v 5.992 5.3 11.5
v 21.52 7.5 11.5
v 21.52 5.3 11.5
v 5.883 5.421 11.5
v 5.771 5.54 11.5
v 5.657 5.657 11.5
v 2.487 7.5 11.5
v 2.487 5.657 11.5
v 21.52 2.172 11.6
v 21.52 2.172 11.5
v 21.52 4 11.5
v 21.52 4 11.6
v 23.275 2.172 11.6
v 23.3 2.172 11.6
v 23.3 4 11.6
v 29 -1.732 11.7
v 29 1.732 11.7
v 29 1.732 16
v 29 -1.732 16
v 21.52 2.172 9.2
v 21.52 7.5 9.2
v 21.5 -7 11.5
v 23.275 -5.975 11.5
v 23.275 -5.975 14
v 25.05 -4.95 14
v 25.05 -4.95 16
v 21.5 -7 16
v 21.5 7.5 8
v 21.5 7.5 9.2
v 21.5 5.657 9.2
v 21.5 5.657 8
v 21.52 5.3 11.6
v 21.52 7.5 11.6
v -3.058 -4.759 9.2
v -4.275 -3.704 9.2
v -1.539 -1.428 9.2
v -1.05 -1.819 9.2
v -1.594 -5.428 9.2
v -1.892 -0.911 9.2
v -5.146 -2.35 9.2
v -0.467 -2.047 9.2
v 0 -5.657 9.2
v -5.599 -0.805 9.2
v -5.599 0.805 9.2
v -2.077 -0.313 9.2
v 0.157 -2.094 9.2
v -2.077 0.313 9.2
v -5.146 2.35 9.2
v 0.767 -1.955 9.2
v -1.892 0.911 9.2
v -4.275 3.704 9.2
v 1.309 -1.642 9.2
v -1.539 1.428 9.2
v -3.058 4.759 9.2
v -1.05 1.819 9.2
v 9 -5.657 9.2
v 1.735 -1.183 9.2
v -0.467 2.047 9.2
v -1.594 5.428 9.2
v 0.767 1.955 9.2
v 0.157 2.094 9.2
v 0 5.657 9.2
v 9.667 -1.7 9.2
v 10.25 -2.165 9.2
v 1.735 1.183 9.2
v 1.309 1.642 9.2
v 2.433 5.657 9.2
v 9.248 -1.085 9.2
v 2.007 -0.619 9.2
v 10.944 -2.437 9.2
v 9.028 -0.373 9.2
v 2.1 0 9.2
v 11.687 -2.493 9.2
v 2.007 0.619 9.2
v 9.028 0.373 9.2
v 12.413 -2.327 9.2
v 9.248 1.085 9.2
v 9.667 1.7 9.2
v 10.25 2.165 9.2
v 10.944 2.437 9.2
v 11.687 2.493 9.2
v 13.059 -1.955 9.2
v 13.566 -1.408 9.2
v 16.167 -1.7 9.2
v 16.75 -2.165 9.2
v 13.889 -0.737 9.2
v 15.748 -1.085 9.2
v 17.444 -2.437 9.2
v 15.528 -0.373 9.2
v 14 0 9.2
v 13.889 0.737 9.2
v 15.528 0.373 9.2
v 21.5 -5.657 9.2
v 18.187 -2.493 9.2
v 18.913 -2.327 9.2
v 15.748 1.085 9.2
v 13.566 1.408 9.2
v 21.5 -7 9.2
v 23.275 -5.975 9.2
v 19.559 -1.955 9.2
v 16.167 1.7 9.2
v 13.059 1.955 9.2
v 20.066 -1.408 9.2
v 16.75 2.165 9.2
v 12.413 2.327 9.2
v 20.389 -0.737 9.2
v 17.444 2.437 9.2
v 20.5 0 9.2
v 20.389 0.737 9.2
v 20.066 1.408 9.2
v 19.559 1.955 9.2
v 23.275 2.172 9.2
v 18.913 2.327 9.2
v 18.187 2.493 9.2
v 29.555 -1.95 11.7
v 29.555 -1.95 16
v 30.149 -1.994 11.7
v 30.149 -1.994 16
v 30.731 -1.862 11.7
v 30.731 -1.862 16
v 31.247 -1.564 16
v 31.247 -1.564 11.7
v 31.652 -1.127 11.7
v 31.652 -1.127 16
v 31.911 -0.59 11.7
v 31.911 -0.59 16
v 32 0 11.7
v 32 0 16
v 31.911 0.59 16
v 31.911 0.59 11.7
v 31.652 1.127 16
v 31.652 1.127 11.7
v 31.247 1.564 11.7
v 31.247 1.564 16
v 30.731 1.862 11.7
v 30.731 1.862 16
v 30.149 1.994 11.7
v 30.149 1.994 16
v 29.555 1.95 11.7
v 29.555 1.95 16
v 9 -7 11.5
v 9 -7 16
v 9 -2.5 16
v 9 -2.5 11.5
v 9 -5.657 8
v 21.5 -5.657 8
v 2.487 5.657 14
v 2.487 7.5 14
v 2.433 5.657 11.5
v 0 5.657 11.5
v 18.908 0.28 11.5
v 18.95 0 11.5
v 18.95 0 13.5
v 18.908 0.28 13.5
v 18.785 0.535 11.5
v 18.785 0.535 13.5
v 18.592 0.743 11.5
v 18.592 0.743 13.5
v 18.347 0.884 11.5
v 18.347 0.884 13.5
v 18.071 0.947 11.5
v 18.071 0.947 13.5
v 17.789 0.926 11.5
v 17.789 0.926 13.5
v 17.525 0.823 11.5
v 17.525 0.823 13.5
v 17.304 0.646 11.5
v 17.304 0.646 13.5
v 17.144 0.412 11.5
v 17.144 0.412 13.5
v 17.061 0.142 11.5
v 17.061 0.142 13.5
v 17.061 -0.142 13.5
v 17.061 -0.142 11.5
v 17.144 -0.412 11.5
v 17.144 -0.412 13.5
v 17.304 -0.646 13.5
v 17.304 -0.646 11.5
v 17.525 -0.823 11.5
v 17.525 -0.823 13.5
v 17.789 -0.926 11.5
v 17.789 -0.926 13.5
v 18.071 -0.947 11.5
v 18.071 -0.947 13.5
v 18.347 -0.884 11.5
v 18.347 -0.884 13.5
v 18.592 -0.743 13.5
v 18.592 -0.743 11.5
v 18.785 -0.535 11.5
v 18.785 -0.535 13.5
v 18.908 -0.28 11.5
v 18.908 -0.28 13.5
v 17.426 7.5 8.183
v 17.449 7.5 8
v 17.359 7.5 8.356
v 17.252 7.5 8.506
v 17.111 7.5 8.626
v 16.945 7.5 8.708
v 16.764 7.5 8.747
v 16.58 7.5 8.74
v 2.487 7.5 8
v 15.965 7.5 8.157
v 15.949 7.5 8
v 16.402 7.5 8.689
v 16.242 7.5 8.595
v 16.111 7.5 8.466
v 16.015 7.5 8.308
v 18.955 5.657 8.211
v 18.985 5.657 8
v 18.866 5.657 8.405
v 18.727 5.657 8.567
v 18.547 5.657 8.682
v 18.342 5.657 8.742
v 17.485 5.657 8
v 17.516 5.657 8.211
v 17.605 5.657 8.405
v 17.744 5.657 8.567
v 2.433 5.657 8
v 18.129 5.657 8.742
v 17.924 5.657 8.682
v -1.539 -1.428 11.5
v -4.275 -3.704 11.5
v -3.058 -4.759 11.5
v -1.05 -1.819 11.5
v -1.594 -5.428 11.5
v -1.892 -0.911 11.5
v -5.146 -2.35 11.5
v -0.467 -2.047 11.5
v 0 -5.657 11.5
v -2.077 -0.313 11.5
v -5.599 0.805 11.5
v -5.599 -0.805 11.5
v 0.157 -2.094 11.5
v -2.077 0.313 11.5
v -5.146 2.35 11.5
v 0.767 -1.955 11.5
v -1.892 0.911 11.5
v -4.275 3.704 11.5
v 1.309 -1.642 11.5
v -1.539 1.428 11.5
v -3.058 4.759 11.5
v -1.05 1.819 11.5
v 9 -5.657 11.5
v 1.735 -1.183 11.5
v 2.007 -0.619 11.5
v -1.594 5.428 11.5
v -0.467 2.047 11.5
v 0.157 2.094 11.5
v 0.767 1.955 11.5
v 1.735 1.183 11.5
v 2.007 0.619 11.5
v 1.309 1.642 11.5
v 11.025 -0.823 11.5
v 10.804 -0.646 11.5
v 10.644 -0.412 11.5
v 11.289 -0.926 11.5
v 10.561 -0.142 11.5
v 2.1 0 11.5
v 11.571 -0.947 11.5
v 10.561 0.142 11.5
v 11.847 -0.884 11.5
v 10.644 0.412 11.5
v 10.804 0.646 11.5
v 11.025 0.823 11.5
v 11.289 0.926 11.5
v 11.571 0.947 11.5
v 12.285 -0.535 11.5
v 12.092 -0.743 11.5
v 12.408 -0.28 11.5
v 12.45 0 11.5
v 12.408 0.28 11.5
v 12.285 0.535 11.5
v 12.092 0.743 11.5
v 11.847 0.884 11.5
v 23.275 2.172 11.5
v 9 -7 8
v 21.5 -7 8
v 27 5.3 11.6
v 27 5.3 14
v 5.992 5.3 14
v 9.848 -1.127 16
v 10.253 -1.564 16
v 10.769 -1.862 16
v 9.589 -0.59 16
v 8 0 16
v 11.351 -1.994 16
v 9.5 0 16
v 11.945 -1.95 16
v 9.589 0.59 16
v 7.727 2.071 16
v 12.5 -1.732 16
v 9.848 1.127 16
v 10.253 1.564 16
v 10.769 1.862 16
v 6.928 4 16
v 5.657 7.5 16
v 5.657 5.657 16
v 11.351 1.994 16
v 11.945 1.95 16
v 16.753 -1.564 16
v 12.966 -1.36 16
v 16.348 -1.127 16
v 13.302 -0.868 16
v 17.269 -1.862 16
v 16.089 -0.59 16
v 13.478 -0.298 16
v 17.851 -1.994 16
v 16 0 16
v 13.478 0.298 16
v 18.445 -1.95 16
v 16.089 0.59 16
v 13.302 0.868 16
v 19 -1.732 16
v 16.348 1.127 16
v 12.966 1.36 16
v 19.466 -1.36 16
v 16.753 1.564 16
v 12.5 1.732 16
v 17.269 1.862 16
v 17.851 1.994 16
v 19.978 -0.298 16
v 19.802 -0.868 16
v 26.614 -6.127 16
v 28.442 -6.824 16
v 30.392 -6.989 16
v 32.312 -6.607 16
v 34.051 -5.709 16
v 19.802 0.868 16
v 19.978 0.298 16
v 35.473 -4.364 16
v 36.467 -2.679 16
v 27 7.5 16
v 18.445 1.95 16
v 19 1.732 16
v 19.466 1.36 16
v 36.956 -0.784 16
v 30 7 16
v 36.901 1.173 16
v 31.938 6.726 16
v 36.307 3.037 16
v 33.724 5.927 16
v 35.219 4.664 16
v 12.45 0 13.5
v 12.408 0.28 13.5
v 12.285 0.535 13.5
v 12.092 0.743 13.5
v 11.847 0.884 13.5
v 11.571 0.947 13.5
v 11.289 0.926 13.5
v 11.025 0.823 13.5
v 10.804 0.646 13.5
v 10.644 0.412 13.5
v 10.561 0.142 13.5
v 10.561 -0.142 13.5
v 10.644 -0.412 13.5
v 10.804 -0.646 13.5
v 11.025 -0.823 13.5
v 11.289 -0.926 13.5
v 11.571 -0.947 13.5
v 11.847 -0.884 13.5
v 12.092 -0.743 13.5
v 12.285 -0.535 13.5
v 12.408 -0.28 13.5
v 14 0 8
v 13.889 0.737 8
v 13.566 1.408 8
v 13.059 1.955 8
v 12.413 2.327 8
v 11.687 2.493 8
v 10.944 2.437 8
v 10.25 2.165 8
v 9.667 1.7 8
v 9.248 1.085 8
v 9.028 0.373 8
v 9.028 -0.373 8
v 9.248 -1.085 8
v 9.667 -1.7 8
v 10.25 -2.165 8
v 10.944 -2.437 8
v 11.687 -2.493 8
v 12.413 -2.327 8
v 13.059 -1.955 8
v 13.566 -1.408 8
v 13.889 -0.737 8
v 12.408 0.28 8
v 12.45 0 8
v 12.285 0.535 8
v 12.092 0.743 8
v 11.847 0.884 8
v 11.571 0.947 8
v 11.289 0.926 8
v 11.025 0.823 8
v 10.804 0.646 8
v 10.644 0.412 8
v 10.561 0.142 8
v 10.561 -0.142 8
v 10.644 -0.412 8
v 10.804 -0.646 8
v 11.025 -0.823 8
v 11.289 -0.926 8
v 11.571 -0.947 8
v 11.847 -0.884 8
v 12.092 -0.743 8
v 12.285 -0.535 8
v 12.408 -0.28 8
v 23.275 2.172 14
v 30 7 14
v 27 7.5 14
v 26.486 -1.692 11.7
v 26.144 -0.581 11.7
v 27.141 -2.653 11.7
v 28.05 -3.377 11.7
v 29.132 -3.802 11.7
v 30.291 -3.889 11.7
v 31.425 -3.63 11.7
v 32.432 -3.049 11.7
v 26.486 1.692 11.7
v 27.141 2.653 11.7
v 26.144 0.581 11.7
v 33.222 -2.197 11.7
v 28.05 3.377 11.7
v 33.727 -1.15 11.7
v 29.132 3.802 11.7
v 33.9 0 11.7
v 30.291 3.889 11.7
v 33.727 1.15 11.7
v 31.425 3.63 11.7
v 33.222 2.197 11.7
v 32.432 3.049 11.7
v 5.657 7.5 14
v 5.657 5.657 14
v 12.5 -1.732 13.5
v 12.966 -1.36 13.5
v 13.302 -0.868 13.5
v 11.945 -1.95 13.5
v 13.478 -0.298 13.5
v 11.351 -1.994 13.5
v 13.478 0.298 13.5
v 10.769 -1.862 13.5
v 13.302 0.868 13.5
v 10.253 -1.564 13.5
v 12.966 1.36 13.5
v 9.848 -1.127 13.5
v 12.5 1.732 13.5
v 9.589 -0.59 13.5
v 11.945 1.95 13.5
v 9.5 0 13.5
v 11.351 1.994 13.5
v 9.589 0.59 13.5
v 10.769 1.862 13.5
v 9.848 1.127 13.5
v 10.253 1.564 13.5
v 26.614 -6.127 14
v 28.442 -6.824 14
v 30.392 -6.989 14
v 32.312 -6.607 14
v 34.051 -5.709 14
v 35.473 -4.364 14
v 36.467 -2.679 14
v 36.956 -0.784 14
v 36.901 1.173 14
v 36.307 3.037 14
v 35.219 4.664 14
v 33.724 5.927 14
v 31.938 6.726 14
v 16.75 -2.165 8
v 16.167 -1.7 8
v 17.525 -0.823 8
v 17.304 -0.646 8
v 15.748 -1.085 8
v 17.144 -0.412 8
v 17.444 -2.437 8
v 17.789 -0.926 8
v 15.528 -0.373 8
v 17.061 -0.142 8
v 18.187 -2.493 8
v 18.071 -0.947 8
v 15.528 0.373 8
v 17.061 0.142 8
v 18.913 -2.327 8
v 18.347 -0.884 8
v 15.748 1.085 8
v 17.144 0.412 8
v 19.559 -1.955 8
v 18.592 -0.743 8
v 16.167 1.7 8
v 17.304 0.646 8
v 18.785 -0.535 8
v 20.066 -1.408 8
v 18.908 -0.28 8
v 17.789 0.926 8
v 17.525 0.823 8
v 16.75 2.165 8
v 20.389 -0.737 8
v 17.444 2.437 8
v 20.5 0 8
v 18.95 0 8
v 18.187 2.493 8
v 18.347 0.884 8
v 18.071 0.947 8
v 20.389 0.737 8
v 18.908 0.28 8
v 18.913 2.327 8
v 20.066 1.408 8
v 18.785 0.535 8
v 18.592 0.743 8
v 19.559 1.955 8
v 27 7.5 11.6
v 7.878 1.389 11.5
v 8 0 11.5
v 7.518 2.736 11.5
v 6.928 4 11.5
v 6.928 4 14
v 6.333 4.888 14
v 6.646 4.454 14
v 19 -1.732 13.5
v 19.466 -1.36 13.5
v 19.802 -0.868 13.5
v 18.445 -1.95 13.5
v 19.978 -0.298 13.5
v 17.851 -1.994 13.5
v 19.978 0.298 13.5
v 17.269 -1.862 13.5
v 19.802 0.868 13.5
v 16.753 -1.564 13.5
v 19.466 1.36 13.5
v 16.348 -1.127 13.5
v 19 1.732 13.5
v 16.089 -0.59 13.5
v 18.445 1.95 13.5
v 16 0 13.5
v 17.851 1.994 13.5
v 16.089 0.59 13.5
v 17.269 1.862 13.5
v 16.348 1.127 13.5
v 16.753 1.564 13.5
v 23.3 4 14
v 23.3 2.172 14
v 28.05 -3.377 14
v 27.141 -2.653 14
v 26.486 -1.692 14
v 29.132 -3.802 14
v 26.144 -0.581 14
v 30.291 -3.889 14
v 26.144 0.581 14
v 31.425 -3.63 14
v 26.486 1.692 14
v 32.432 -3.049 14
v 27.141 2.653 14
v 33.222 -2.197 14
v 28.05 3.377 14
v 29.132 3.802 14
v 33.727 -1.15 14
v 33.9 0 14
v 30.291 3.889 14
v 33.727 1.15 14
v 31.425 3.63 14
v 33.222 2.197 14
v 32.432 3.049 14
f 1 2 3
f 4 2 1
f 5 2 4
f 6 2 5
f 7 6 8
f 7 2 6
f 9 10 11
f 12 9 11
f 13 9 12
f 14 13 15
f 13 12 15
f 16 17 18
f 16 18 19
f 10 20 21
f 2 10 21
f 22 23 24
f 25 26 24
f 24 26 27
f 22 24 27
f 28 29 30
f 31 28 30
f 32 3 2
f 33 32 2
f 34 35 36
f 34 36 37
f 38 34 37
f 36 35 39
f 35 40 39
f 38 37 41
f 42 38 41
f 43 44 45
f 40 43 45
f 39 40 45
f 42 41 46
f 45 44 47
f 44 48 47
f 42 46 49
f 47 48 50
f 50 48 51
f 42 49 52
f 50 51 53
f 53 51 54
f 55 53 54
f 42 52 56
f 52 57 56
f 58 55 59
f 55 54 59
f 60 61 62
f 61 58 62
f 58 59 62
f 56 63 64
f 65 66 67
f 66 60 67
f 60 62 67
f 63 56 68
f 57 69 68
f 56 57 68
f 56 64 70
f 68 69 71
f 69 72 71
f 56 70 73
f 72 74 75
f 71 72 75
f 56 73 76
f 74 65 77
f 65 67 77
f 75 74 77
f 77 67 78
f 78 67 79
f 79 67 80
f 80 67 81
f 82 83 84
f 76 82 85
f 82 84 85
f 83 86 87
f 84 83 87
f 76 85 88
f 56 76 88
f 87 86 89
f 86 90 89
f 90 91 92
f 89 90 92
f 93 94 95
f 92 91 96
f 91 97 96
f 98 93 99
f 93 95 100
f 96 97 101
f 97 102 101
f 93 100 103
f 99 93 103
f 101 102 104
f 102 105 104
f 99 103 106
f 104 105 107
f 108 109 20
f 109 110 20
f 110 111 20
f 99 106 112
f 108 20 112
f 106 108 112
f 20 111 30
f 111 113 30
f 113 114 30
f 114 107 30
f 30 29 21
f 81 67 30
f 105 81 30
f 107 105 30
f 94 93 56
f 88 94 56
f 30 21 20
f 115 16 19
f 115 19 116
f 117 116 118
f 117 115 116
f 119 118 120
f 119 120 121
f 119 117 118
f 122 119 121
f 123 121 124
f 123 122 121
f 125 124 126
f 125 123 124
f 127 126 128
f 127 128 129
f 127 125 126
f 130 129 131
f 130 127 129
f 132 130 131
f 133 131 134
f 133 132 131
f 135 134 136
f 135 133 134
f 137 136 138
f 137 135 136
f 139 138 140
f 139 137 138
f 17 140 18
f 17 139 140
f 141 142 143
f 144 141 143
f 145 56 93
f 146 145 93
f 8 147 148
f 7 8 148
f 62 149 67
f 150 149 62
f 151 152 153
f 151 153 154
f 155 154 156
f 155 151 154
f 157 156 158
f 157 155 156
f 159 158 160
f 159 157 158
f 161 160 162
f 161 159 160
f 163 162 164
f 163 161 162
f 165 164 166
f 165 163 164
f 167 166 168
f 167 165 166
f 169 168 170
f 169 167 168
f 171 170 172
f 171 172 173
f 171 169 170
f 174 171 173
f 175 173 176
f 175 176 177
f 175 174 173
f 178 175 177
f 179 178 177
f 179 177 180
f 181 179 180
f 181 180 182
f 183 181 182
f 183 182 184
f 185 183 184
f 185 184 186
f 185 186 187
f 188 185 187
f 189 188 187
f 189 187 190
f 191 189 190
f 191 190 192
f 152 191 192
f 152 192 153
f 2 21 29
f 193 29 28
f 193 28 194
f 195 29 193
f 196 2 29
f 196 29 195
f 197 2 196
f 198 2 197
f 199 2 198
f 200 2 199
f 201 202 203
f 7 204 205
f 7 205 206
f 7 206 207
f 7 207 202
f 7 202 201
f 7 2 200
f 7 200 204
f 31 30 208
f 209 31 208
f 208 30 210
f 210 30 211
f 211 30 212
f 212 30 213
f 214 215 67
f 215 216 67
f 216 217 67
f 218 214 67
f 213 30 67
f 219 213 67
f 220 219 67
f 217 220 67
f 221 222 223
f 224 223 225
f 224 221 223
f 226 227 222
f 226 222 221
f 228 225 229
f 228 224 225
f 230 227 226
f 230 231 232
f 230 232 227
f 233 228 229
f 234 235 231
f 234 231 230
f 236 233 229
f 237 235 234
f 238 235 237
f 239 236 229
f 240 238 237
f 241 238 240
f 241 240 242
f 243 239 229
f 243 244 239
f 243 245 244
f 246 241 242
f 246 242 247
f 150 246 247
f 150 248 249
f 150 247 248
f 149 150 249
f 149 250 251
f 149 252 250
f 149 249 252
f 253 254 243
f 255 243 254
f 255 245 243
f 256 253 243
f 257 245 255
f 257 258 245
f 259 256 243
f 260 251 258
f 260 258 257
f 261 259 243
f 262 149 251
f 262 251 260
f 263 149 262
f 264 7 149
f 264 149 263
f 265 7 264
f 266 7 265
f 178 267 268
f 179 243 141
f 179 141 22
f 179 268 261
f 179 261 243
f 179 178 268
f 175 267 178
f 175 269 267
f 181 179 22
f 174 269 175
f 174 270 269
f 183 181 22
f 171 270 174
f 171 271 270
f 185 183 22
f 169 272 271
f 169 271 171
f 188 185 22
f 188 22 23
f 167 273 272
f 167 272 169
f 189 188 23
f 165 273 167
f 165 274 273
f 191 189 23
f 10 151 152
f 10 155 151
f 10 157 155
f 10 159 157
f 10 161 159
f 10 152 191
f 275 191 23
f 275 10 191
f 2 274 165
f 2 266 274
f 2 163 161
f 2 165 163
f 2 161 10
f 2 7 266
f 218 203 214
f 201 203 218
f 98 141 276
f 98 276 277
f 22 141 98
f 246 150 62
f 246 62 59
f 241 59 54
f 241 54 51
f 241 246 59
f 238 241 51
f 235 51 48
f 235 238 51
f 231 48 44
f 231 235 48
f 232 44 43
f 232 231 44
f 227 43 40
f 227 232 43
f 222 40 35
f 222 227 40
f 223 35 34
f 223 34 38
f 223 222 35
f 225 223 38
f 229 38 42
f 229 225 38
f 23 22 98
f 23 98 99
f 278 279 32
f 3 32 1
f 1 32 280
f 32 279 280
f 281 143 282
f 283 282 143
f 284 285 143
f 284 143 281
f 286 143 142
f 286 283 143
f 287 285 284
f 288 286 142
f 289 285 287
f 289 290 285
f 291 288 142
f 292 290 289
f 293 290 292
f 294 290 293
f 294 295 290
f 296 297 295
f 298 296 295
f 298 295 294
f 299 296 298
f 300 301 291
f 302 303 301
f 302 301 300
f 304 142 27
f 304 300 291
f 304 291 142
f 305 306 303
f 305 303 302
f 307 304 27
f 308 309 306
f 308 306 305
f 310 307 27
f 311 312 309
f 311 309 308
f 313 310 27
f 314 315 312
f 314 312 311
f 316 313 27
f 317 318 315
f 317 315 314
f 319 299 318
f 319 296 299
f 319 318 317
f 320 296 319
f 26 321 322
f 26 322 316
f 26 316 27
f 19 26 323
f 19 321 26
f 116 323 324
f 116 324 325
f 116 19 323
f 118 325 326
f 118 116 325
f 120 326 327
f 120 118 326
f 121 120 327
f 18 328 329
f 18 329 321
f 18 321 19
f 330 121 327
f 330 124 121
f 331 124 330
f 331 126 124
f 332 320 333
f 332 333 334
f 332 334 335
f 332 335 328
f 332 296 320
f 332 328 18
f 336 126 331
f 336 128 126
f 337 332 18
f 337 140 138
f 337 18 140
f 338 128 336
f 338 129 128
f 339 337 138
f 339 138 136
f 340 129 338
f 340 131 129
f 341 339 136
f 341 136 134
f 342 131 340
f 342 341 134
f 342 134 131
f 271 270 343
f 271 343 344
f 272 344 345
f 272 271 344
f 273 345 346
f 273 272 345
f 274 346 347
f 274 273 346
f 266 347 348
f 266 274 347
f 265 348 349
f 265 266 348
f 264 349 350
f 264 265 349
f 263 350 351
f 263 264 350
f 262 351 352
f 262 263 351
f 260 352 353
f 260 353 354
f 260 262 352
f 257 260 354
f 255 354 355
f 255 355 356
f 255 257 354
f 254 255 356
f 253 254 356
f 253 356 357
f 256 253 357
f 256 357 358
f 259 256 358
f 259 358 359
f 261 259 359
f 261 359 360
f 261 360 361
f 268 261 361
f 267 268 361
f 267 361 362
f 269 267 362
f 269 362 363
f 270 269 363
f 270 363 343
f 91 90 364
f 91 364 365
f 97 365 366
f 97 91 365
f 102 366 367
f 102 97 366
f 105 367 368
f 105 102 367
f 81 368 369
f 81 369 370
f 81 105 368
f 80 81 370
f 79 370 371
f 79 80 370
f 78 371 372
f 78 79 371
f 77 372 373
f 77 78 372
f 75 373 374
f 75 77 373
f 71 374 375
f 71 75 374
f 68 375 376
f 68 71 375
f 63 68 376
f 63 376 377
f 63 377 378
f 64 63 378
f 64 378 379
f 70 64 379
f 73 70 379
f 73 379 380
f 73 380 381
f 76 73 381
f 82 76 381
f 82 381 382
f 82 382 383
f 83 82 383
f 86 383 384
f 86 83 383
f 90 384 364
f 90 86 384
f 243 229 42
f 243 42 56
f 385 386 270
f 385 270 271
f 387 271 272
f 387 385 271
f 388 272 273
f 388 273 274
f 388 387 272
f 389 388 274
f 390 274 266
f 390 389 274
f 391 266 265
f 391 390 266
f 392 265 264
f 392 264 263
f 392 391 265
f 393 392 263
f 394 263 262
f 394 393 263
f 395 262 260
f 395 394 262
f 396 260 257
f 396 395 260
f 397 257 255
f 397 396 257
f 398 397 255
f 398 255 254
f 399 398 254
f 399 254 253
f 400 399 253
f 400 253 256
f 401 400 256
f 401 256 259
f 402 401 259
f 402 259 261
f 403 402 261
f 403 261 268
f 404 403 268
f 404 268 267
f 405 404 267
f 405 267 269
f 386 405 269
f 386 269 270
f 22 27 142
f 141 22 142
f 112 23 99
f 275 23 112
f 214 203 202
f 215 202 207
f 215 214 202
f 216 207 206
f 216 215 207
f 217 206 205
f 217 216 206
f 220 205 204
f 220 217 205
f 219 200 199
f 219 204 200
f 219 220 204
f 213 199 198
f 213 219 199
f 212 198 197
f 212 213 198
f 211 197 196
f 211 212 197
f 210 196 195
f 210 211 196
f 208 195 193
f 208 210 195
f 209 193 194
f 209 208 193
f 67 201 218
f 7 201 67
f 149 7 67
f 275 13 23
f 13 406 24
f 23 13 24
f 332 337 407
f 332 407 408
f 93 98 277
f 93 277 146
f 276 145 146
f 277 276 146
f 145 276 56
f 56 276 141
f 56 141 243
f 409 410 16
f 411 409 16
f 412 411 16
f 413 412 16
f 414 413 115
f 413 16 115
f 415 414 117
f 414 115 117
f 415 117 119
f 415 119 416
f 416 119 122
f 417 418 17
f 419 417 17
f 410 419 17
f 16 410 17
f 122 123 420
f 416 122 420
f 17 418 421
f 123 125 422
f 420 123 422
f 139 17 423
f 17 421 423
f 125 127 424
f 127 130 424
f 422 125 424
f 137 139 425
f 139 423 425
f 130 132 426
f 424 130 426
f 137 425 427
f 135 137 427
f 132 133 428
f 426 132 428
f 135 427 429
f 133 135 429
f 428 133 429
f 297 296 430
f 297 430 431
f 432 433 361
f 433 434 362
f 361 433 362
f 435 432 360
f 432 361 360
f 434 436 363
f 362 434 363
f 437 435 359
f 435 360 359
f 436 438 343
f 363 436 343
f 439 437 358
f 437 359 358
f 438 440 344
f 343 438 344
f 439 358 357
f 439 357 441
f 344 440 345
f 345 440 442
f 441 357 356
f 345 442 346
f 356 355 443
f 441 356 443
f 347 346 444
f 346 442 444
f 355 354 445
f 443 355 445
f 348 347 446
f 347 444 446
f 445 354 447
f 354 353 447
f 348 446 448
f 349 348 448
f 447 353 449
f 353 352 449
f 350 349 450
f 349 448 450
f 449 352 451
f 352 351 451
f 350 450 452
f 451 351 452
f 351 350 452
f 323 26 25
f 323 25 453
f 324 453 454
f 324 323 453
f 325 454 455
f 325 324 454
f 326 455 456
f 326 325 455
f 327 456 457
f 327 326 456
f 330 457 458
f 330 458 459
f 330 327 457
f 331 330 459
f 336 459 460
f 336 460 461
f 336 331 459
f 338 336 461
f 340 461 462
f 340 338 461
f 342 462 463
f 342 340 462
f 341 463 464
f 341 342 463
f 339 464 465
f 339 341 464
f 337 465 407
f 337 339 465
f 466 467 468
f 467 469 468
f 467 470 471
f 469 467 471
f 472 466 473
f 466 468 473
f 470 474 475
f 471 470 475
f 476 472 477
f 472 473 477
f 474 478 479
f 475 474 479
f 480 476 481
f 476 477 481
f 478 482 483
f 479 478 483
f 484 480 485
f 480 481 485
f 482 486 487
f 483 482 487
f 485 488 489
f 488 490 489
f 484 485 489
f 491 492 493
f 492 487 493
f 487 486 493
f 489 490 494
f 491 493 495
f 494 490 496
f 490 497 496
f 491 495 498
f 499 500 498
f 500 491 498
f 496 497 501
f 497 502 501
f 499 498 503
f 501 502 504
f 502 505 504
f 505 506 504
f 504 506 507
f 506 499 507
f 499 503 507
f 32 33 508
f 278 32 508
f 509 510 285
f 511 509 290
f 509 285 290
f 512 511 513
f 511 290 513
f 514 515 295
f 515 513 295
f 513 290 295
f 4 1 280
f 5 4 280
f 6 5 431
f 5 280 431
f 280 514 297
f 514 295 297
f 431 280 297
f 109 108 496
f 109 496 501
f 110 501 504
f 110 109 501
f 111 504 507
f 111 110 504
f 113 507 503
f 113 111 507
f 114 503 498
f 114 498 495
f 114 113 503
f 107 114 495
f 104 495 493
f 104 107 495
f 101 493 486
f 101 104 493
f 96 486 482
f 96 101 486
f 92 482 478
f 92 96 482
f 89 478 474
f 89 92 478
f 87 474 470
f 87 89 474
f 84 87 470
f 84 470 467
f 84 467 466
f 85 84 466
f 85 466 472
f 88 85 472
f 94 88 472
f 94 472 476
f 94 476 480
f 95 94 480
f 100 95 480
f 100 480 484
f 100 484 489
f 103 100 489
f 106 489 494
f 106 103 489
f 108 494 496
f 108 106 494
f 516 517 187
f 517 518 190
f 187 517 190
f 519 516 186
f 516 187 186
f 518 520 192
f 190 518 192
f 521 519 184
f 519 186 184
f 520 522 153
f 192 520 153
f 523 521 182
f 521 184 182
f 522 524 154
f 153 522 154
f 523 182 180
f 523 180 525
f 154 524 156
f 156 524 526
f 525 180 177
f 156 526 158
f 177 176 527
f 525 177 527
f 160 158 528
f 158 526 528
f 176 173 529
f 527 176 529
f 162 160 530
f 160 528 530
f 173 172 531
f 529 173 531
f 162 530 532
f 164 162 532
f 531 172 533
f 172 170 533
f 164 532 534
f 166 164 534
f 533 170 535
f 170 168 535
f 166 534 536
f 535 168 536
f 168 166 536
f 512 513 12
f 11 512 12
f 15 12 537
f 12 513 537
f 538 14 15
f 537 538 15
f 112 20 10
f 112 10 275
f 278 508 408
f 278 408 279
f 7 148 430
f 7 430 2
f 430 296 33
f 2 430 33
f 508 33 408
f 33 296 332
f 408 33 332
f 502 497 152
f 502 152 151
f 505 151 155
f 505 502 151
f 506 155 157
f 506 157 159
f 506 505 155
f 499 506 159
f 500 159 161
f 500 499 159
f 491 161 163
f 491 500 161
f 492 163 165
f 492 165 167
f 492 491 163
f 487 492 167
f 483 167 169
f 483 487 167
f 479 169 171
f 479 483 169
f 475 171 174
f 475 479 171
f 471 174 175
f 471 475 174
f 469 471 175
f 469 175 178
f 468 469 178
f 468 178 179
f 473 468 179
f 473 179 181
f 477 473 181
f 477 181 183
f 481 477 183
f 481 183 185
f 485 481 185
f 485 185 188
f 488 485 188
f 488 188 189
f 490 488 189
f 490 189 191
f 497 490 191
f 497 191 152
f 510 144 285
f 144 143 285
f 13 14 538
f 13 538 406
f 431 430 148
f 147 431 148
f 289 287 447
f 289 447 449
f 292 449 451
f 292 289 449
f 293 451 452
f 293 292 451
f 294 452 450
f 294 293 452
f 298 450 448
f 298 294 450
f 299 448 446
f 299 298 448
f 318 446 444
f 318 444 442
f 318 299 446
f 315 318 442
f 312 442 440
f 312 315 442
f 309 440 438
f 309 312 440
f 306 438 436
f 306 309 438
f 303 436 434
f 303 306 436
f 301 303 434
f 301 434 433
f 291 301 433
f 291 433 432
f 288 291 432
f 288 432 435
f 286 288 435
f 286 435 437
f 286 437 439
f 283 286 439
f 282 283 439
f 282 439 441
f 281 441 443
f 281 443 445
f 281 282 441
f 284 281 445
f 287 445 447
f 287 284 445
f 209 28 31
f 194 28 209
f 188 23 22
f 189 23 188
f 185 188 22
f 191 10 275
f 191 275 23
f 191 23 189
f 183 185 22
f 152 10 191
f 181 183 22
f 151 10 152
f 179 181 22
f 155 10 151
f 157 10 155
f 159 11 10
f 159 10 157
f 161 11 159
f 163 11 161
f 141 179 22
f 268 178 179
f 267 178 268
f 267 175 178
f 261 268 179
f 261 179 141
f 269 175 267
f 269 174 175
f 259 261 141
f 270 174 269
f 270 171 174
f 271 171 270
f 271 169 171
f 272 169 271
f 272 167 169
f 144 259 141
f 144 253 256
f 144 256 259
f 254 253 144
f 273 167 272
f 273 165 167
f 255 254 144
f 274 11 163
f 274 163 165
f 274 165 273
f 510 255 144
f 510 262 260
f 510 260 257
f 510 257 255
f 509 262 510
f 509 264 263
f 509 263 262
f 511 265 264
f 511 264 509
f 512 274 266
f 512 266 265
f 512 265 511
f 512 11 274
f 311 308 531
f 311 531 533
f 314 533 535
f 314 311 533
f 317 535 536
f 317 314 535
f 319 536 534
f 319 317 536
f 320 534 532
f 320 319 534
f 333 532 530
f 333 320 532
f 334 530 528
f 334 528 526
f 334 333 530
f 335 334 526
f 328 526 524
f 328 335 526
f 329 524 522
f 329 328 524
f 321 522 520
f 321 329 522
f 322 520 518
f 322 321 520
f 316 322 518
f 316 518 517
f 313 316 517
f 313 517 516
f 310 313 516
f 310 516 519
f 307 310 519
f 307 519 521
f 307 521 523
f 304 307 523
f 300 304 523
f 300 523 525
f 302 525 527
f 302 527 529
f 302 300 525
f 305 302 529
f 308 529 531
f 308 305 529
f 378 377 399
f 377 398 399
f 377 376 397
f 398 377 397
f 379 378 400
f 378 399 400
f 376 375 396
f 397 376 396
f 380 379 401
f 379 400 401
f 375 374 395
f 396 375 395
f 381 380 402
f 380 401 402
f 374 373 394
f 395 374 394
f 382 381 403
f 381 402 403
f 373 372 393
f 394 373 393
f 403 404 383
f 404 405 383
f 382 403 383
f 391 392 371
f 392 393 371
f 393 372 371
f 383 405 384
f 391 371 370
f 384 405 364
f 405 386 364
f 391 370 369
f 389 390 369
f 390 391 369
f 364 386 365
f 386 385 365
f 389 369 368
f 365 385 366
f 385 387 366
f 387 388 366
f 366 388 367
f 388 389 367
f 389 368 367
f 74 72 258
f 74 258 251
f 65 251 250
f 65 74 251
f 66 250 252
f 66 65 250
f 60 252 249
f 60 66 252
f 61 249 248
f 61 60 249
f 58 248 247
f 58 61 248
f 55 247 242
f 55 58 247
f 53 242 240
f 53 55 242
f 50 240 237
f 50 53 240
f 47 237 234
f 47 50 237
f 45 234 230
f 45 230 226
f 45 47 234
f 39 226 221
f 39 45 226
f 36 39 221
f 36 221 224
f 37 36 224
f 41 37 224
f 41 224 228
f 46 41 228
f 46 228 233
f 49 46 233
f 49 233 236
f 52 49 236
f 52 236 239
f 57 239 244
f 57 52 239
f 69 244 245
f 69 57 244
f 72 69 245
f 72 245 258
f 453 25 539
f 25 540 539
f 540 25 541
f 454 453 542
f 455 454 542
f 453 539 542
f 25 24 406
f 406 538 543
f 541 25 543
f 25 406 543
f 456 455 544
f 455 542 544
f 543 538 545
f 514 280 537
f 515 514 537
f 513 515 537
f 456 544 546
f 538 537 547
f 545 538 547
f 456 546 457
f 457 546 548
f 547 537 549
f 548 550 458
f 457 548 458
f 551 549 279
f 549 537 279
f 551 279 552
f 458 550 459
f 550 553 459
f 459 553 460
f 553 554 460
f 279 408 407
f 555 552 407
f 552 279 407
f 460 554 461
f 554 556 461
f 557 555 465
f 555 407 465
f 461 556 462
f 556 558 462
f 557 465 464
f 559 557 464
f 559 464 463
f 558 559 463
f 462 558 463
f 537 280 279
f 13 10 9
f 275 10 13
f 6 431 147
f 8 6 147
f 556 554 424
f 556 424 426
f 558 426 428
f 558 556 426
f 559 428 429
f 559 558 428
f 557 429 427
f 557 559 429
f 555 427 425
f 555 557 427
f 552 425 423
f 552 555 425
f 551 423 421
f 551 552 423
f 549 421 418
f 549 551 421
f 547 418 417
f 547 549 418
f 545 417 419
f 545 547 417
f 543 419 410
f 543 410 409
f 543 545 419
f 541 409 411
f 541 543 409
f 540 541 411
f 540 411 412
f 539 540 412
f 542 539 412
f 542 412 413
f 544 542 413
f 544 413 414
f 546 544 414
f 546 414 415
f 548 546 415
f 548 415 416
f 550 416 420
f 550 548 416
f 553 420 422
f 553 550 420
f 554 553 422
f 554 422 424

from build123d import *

# Parameters (mm, degrees)
BOSS_EXTRUDE1_DEPTH  = 2
BOSS_EXTRUDE6_DEPTH  = 2.5
CUT_EXTRUDE6_DEPTH   = 2.5
BOSS_EXTRUDE14_DEPTH = 2.3
SKETCH32_R           = 2.1
CUT_EXTRUDE7_DEPTH   = 2.3
SKETCH33_W           = 12.5
SKETCH33_H           = 1.343145751
BOSS_EXTRUDE15_DEPTH = 1.2
SKETCH35_W           = 5.479645997
SKETCH35_H           = 5.327993755
CUT_EXTRUDE8_DEPTH   = 2.4
SKETCH36_W           = 3.7
SKETCH36_H           = 1.827993755
CUT_EXTRUDE9_DEPTH   = 2.4
SKETCH37_R           = 3.9
BOSS_EXTRUDE16_DEPTH = 2.3
CUT_EXTRUDE10_DEPTH  = 5.3
SKETCH43_R           = 2.5
BOSS_EXTRUDE17_DEPTH = 1.2
SKETCH44_R           = 0.95
CUT_EXTRUDE11_DEPTH  = 9
SKETCH45_R           = 2
CUT_EXTRUDE12_DEPTH  = 2.5
SKETCH52_R           = 0.75
CUT_EXTRUDE13_DEPTH  = 10


with BuildPart() as part:
    # Sketch3 → Boss-Extrude1 (new body)
    with BuildSketch(Plane.XY):
        with BuildLine():
            Line((8, 0), (9, -2.5))
            Line((9, -2.5), (9, -7))
            Line((9, -7), (21.5, -7))
            Line((21.5, -7), (25.050252532, -4.949747468))
            ThreePointArc((25.050252532, -4.949747468), (36.467156728, -2.678784027), (30, 7))
            Line((30, 7), (27, 7.5))
            Line((27, 7.5), (5.656854249, 7.5))
            Line((5.656854249, 7.5), (5.656854249, 5.656854249))
            ThreePointArc((5.656854249, 5.656854249), (7.39103626, 3.061467459), (8, 0))
        make_face()
    extrude(amount=BOSS_EXTRUDE1_DEPTH)

    # Sketch22 → Boss-Extrude6 (add)
    with BuildSketch(Plane.XY.offset(2)):
        with BuildLine():
            Line((5.656854249, 5.656854249), (2.486790148, 5.656854249))
            Line((2.486790148, 5.656854249), (2.486790148, 7.5))
            Line((2.486790148, 7.5), (5.656854249, 7.5))
            Line((5.656854249, 7.5), (21.5, 7.5))
            Line((21.5, 7.5), (27, 7.5))
            Line((27, 7.5), (27, 2.172006245))
            Line((27, 2.172006245), (23.275126266, 2.172006245))
            Line((23.275126266, 2.172006245), (23.275126266, -5.974873734))
            Line((23.275126266, -5.974873734), (21.5, -7))
            Line((21.5, -7), (9, -7))
            Line((9, -7), (9, -2.5))
            Line((9, -2.5), (8, 0))
            ThreePointArc((8, 0), (7.39103626, 3.061467459), (5.656854249, 5.656854249))
        make_face()
    extrude(amount=BOSS_EXTRUDE6_DEPTH)

    # Sketch26 → Cut-Extrude6 (cut)
    with BuildSketch(Plane.XY.offset(2)):
        Polygon((18.098080448, 5.3), (2.530052458, 5.3), (2.530052458, 4), (18.098080448, 4), (27, 4), (27, 5.3), align=None)
    extrude(amount=CUT_EXTRUDE6_DEPTH, mode=Mode.SUBTRACT)


with BuildPart() as body_2:
    # Sketch31 → Boss-Extrude14 (new body)
    with BuildSketch(Plane.XY.offset(4.5)):
        with BuildLine():
            Line((2.432688066, 5.656854249), (0, 5.656854249))
            ThreePointArc((0, 5.656854249), (-5.656854249, 0), (0, -5.656854249))
            Line((0, -5.656854249), (9, -5.656854249))
            Line((9, -5.656854249), (9, -7))
            Line((9, -7), (21.5, -7))
            Line((21.5, -7), (23.275126266, -5.974873734))
            Line((23.275126266, -5.974873734), (23.275126266, 2.172006245))
            Line((23.275126266, 2.172006245), (27, 2.172006245))
            Line((27, 2.172006245), (27, 7.5))
            Line((27, 7.5), (2.486790148, 7.5))
            Line((2.486790148, 7.5), (2.432688066, 5.656854249))
        make_face()
    extrude(amount=BOSS_EXTRUDE14_DEPTH)

    # Sketch32 → Cut-Extrude7 (cut)
    with BuildSketch(Plane.XY.offset(6.8)):
        Circle(SKETCH32_R)
    extrude(amount=-CUT_EXTRUDE7_DEPTH, mode=Mode.SUBTRACT)

    # Sketch33 → Boss-Extrude15 (add)
    with BuildSketch(Plane.XY.offset(6.8)):
        with Locations((15.25, -6.328427125)):
            Rectangle(SKETCH33_W, SKETCH33_H)
        Polygon((2.486790148, 7.5), (21.5, 7.5), (21.5, 5.656854249), (2.432688066, 5.656854249), align=None)
    extrude(amount=BOSS_EXTRUDE15_DEPTH)


with BuildPart() as cut_extrude8_tool:
    # Sketch35 → Cut-Extrude8 (new body)
    with BuildSketch(Plane.XY.offset(6.8)):
        with Locations((24.260177002, 4.836003123)):
            Rectangle(SKETCH35_W, SKETCH35_H)
    extrude(amount=-CUT_EXTRUDE8_DEPTH)


with BuildPart() as part_1:
    add(part.part)

    # Cut-Extrude8: cut by cut_extrude8_tool
    add(cut_extrude8_tool.part, mode=Mode.SUBTRACT)

    # Sketch36 → Cut-Extrude9 (cut)
    with BuildSketch(Plane.XY.offset(4.4)):
        with Locations((25.15, 3.086003123)):
            Rectangle(SKETCH36_W, SKETCH36_H)
    extrude(amount=-CUT_EXTRUDE9_DEPTH, mode=Mode.SUBTRACT)

    # Sketch37 → Boss-Extrude16 (add)
    with BuildSketch(Plane.XY.offset(2)):
        with Locations((30, 0)):
            Circle(SKETCH37_R)
    extrude(amount=BOSS_EXTRUDE16_DEPTH)

    # Sketch39 → Cut-Extrude10 (cut, through all)
    with BuildSketch(Plane.XY.offset(4.3)):
        with BuildLine():
            Line((29, 1.732050808), (29, -1.732050808))
            ThreePointArc((29, -1.732050808), (32, 0), (29, 1.732050808))
        make_face()
    extrude(amount=-CUT_EXTRUDE10_DEPTH, mode=Mode.SUBTRACT)


with BuildPart() as body_2_1:
    add(body_2.part)

    # Cut-Extrude8: cut by cut_extrude8_tool
    add(cut_extrude8_tool.part, mode=Mode.SUBTRACT)

    # Sketch43 → Boss-Extrude17 (add)
    with BuildSketch(Plane.XY.offset(6.8)):
        with Locations((11.5, 0)):
            Circle(SKETCH43_R)
        with Locations((18, 0)):
            Circle(SKETCH43_R)
    extrude(amount=BOSS_EXTRUDE17_DEPTH)


with BuildPart() as cut_extrude11_tool:
    # Sketch44 → Cut-Extrude11 (new body, through all)
    with BuildSketch(Plane.XY.offset(8)):
        with Locations((11.5, 0)):
            Circle(SKETCH44_R)
        with Locations((18, 0)):
            Circle(SKETCH44_R)
    extrude(amount=-CUT_EXTRUDE11_DEPTH)


with BuildPart() as part_2:
    add(part_1.part)

    # Cut-Extrude11: cut by cut_extrude11_tool
    add(cut_extrude11_tool.part, mode=Mode.SUBTRACT)

    # Sketch45 → Cut-Extrude12 (cut)
    with BuildSketch(Plane(origin=(0, 0, 0), x_dir=(-1, 0, 0), z_dir=(0, 0, -1))):
        with Locations((-11.5, 0)):
            Circle(SKETCH45_R)
        with Locations((-18, 0)):
            Circle(SKETCH45_R)
    extrude(amount=-CUT_EXTRUDE12_DEPTH, mode=Mode.SUBTRACT)


with BuildPart() as body_2_2:
    add(body_2_1.part)

    # Cut-Extrude11: cut by cut_extrude11_tool
    add(cut_extrude11_tool.part, mode=Mode.SUBTRACT)

    # Sketch52 → Cut-Extrude13 (cut, along a direction that is not the sketch's normal)
    with BuildSketch(Plane.XZ.offset(-5.656854249)):
        with Locations((18.235476819, 8)):
            Circle(SKETCH52_R)
    extrude(amount=-CUT_EXTRUDE13_DEPTH, dir=(0.640410196, -0.76803306, 0), mode=Mode.SUBTRACT)


with BuildPart() as body_3:
    # Mirror1: mirrored copy
    add(body_2_2.part.mirror(Plane.XY.offset(8)))


with BuildPart() as body_4:
    # Mirror1 2: mirrored copy
    add(part_2.part.mirror(Plane.XY.offset(8)))


solid = Compound([body_3.part, body_4.part])
